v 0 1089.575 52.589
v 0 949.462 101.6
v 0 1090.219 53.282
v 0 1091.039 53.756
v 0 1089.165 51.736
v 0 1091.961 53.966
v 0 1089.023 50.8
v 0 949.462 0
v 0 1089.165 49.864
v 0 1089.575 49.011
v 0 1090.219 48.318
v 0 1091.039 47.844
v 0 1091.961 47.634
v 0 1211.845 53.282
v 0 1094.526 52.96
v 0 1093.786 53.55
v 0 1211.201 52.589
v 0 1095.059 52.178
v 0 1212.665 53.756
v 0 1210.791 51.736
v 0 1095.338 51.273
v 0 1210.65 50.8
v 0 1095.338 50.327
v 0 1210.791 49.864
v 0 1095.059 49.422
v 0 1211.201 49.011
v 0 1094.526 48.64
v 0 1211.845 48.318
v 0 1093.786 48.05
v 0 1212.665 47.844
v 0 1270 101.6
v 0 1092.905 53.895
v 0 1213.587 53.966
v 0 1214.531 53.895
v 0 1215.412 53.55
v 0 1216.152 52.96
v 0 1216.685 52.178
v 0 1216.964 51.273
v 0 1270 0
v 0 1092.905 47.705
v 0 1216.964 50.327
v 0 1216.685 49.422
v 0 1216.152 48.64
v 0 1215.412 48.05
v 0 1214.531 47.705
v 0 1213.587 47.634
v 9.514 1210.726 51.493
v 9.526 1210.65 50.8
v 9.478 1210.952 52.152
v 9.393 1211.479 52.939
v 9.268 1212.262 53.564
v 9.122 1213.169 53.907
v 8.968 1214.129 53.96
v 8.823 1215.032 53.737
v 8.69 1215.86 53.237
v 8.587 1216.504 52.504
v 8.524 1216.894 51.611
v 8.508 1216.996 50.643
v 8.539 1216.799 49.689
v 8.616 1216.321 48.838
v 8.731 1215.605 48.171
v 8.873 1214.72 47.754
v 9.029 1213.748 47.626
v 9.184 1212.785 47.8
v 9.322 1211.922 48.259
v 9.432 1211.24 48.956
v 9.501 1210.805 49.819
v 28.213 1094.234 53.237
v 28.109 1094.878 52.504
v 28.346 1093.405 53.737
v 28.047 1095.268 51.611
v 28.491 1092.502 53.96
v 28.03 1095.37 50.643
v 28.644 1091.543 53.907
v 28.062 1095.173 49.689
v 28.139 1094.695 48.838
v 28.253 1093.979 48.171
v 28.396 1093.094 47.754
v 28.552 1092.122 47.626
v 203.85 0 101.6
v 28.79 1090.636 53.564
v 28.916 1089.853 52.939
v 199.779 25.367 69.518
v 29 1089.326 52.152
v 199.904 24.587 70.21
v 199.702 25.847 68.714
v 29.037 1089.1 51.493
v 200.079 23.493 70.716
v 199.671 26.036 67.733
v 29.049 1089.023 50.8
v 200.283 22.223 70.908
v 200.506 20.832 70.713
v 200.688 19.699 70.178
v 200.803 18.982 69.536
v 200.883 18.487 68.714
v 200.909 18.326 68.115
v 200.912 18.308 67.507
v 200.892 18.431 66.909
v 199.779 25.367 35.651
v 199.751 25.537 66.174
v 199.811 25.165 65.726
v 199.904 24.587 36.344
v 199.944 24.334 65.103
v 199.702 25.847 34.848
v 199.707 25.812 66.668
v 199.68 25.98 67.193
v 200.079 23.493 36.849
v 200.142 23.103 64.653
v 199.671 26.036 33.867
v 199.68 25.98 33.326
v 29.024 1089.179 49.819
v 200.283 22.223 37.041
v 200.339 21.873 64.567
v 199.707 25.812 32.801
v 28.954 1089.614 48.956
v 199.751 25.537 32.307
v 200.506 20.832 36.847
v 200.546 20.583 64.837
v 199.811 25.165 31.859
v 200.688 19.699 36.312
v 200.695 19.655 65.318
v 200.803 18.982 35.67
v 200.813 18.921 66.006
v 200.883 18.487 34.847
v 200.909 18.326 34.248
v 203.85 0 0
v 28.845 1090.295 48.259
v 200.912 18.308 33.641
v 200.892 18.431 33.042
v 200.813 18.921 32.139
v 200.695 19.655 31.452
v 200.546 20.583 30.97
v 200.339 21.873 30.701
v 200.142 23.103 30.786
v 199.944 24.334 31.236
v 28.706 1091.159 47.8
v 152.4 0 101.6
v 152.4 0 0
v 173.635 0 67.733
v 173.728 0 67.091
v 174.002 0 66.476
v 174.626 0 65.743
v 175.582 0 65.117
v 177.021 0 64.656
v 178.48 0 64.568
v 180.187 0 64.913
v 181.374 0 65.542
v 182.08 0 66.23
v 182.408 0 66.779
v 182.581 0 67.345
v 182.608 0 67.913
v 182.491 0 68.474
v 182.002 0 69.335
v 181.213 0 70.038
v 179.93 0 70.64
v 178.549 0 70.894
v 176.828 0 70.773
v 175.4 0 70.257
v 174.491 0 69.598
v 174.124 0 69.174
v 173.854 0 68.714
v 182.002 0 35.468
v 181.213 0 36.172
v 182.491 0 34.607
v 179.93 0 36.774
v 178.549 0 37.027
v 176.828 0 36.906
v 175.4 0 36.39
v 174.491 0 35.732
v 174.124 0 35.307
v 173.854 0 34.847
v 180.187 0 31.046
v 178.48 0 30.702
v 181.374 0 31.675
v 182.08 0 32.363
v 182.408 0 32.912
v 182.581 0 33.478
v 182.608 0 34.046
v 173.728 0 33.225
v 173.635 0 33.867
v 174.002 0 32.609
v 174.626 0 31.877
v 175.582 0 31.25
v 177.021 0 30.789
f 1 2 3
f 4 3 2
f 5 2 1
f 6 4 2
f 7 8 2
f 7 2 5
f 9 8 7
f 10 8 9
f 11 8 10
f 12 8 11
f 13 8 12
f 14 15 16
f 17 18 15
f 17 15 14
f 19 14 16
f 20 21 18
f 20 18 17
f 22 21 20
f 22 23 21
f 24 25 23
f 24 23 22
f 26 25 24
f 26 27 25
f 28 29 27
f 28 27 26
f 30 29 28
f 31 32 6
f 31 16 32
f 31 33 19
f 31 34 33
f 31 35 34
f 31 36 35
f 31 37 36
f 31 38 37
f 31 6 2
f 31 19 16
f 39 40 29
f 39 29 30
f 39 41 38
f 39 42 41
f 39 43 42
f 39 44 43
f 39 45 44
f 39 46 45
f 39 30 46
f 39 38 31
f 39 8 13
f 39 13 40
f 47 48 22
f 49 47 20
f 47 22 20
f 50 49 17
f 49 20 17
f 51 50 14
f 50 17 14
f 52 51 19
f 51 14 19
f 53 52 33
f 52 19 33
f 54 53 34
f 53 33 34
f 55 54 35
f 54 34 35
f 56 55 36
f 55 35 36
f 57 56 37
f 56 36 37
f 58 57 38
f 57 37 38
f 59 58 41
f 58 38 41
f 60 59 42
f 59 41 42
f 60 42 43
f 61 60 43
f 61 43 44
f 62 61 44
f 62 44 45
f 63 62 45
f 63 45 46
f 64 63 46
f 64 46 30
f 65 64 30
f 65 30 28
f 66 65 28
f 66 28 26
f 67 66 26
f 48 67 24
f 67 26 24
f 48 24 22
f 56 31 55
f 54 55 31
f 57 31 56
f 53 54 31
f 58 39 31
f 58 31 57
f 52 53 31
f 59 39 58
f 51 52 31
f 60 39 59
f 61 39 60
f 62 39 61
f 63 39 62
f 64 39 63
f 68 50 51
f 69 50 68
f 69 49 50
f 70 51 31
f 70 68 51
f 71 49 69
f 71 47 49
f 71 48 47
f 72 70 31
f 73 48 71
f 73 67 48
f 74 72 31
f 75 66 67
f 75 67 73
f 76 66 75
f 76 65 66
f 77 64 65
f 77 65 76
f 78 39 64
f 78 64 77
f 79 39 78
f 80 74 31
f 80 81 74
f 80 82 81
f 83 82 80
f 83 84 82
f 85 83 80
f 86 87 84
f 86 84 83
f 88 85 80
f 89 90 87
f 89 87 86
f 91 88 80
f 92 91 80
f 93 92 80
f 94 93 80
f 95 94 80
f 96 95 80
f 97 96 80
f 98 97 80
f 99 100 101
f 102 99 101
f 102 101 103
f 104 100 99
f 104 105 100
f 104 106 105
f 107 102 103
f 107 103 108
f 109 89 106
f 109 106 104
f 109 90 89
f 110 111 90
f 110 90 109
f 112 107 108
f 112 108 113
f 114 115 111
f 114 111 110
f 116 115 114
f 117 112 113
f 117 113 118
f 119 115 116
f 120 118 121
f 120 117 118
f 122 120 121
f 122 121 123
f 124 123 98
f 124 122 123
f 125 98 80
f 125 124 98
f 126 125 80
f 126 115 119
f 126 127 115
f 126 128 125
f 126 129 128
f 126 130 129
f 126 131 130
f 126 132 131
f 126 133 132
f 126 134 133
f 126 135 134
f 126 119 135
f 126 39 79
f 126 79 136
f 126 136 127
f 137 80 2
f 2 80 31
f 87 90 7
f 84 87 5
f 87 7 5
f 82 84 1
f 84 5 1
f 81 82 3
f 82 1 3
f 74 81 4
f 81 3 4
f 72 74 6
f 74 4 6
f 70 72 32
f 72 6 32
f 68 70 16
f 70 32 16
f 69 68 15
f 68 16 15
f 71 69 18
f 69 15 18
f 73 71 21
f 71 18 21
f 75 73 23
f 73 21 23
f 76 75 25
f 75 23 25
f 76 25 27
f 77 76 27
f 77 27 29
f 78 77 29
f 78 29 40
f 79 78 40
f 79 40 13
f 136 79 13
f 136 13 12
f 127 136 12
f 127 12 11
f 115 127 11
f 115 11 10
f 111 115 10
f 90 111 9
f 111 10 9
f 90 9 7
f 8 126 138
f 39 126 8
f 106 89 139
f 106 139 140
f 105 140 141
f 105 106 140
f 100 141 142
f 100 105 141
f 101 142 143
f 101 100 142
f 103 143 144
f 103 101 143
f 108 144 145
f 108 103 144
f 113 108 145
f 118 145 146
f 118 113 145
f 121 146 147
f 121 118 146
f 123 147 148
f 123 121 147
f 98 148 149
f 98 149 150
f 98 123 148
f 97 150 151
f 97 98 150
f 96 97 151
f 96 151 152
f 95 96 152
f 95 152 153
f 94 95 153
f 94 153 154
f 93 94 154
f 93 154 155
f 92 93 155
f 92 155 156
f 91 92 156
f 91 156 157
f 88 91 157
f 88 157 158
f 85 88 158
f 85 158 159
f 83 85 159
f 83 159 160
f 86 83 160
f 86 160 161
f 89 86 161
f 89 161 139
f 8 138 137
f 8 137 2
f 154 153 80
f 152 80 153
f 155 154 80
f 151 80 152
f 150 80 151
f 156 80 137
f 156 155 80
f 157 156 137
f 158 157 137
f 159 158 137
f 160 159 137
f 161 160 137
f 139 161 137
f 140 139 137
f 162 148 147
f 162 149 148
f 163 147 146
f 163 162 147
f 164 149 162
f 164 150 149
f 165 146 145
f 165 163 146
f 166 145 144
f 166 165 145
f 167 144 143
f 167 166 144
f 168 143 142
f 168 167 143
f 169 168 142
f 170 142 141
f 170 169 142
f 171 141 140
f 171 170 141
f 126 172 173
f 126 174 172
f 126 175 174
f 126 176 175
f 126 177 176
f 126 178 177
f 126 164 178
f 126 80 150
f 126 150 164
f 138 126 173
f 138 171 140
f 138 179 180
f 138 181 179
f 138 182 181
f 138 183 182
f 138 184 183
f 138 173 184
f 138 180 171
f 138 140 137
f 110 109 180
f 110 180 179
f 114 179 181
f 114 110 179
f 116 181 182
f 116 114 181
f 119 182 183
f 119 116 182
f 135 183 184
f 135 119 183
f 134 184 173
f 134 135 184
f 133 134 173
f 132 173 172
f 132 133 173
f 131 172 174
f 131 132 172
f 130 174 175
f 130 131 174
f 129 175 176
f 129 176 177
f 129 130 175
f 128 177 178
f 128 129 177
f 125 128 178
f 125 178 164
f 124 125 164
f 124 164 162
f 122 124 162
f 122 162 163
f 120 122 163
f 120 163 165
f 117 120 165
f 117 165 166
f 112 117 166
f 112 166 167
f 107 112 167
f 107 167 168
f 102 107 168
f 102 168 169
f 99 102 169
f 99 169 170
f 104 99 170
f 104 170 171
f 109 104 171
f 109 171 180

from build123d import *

# Parameters (mm, degrees)
BOSS_EXTRUDE1_DEPTH     = 101.6
SKETCH2_R               = 3.175
CUT_EXTRUDE1_DEPTH      = 930.148
CUT_EXTRUDE2_DEPTH      = 129.032
CUT_EXTRUDE2_DEPTH_BACK = 167.132
SKETCH3_R               = 3.175


with BuildPart() as part:
    # Sketch1 → Boss-Extrude1 (new body)
    with BuildSketch(Plane.XY):
        Polygon((0, 949.461691672), (0, 1270), (203.850246616, 0), (152.4, 0), align=None)
    extrude(amount=BOSS_EXTRUDE1_DEPTH)

    # Sketch2 → Cut-Extrude1 (cut)
    with BuildSketch(Plane.ZY):
        with Locations(Location((50.8, 1213.824708718, 0), (0, 0, 270))):
            Circle(SKETCH2_R)
        with Locations(Location((50.8, 1092.198474258, 0), (0, 0, 270))):
            Circle(SKETCH2_R)
    extrude(amount=-CUT_EXTRUDE1_DEPTH, mode=Mode.SUBTRACT)

    # Sketch3 → Cut-Extrude2 (cut, two sides: drawn at the far end of the back side and taken through both)
    with BuildSketch(Plane(origin=(101.925123308, 101.925123308, 0), x_dir=(0, 0, -1), z_dir=(-0.7071067811865487, -0.7071067811865465, 0)).offset(-CUT_EXTRUDE2_DEPTH_BACK)):
        with Locations(Location((-67.733333333, 125.953482591, 0), (0, 0, 270))):
            Circle(SKETCH3_R)
        with Locations(Location((-33.866666667, 125.953482591, 0), (0, 0, 270))):
            Circle(SKETCH3_R)
    extrude(amount=CUT_EXTRUDE2_DEPTH + CUT_EXTRUDE2_DEPTH_BACK, mode=Mode.SUBTRACT)


solid = part.part
